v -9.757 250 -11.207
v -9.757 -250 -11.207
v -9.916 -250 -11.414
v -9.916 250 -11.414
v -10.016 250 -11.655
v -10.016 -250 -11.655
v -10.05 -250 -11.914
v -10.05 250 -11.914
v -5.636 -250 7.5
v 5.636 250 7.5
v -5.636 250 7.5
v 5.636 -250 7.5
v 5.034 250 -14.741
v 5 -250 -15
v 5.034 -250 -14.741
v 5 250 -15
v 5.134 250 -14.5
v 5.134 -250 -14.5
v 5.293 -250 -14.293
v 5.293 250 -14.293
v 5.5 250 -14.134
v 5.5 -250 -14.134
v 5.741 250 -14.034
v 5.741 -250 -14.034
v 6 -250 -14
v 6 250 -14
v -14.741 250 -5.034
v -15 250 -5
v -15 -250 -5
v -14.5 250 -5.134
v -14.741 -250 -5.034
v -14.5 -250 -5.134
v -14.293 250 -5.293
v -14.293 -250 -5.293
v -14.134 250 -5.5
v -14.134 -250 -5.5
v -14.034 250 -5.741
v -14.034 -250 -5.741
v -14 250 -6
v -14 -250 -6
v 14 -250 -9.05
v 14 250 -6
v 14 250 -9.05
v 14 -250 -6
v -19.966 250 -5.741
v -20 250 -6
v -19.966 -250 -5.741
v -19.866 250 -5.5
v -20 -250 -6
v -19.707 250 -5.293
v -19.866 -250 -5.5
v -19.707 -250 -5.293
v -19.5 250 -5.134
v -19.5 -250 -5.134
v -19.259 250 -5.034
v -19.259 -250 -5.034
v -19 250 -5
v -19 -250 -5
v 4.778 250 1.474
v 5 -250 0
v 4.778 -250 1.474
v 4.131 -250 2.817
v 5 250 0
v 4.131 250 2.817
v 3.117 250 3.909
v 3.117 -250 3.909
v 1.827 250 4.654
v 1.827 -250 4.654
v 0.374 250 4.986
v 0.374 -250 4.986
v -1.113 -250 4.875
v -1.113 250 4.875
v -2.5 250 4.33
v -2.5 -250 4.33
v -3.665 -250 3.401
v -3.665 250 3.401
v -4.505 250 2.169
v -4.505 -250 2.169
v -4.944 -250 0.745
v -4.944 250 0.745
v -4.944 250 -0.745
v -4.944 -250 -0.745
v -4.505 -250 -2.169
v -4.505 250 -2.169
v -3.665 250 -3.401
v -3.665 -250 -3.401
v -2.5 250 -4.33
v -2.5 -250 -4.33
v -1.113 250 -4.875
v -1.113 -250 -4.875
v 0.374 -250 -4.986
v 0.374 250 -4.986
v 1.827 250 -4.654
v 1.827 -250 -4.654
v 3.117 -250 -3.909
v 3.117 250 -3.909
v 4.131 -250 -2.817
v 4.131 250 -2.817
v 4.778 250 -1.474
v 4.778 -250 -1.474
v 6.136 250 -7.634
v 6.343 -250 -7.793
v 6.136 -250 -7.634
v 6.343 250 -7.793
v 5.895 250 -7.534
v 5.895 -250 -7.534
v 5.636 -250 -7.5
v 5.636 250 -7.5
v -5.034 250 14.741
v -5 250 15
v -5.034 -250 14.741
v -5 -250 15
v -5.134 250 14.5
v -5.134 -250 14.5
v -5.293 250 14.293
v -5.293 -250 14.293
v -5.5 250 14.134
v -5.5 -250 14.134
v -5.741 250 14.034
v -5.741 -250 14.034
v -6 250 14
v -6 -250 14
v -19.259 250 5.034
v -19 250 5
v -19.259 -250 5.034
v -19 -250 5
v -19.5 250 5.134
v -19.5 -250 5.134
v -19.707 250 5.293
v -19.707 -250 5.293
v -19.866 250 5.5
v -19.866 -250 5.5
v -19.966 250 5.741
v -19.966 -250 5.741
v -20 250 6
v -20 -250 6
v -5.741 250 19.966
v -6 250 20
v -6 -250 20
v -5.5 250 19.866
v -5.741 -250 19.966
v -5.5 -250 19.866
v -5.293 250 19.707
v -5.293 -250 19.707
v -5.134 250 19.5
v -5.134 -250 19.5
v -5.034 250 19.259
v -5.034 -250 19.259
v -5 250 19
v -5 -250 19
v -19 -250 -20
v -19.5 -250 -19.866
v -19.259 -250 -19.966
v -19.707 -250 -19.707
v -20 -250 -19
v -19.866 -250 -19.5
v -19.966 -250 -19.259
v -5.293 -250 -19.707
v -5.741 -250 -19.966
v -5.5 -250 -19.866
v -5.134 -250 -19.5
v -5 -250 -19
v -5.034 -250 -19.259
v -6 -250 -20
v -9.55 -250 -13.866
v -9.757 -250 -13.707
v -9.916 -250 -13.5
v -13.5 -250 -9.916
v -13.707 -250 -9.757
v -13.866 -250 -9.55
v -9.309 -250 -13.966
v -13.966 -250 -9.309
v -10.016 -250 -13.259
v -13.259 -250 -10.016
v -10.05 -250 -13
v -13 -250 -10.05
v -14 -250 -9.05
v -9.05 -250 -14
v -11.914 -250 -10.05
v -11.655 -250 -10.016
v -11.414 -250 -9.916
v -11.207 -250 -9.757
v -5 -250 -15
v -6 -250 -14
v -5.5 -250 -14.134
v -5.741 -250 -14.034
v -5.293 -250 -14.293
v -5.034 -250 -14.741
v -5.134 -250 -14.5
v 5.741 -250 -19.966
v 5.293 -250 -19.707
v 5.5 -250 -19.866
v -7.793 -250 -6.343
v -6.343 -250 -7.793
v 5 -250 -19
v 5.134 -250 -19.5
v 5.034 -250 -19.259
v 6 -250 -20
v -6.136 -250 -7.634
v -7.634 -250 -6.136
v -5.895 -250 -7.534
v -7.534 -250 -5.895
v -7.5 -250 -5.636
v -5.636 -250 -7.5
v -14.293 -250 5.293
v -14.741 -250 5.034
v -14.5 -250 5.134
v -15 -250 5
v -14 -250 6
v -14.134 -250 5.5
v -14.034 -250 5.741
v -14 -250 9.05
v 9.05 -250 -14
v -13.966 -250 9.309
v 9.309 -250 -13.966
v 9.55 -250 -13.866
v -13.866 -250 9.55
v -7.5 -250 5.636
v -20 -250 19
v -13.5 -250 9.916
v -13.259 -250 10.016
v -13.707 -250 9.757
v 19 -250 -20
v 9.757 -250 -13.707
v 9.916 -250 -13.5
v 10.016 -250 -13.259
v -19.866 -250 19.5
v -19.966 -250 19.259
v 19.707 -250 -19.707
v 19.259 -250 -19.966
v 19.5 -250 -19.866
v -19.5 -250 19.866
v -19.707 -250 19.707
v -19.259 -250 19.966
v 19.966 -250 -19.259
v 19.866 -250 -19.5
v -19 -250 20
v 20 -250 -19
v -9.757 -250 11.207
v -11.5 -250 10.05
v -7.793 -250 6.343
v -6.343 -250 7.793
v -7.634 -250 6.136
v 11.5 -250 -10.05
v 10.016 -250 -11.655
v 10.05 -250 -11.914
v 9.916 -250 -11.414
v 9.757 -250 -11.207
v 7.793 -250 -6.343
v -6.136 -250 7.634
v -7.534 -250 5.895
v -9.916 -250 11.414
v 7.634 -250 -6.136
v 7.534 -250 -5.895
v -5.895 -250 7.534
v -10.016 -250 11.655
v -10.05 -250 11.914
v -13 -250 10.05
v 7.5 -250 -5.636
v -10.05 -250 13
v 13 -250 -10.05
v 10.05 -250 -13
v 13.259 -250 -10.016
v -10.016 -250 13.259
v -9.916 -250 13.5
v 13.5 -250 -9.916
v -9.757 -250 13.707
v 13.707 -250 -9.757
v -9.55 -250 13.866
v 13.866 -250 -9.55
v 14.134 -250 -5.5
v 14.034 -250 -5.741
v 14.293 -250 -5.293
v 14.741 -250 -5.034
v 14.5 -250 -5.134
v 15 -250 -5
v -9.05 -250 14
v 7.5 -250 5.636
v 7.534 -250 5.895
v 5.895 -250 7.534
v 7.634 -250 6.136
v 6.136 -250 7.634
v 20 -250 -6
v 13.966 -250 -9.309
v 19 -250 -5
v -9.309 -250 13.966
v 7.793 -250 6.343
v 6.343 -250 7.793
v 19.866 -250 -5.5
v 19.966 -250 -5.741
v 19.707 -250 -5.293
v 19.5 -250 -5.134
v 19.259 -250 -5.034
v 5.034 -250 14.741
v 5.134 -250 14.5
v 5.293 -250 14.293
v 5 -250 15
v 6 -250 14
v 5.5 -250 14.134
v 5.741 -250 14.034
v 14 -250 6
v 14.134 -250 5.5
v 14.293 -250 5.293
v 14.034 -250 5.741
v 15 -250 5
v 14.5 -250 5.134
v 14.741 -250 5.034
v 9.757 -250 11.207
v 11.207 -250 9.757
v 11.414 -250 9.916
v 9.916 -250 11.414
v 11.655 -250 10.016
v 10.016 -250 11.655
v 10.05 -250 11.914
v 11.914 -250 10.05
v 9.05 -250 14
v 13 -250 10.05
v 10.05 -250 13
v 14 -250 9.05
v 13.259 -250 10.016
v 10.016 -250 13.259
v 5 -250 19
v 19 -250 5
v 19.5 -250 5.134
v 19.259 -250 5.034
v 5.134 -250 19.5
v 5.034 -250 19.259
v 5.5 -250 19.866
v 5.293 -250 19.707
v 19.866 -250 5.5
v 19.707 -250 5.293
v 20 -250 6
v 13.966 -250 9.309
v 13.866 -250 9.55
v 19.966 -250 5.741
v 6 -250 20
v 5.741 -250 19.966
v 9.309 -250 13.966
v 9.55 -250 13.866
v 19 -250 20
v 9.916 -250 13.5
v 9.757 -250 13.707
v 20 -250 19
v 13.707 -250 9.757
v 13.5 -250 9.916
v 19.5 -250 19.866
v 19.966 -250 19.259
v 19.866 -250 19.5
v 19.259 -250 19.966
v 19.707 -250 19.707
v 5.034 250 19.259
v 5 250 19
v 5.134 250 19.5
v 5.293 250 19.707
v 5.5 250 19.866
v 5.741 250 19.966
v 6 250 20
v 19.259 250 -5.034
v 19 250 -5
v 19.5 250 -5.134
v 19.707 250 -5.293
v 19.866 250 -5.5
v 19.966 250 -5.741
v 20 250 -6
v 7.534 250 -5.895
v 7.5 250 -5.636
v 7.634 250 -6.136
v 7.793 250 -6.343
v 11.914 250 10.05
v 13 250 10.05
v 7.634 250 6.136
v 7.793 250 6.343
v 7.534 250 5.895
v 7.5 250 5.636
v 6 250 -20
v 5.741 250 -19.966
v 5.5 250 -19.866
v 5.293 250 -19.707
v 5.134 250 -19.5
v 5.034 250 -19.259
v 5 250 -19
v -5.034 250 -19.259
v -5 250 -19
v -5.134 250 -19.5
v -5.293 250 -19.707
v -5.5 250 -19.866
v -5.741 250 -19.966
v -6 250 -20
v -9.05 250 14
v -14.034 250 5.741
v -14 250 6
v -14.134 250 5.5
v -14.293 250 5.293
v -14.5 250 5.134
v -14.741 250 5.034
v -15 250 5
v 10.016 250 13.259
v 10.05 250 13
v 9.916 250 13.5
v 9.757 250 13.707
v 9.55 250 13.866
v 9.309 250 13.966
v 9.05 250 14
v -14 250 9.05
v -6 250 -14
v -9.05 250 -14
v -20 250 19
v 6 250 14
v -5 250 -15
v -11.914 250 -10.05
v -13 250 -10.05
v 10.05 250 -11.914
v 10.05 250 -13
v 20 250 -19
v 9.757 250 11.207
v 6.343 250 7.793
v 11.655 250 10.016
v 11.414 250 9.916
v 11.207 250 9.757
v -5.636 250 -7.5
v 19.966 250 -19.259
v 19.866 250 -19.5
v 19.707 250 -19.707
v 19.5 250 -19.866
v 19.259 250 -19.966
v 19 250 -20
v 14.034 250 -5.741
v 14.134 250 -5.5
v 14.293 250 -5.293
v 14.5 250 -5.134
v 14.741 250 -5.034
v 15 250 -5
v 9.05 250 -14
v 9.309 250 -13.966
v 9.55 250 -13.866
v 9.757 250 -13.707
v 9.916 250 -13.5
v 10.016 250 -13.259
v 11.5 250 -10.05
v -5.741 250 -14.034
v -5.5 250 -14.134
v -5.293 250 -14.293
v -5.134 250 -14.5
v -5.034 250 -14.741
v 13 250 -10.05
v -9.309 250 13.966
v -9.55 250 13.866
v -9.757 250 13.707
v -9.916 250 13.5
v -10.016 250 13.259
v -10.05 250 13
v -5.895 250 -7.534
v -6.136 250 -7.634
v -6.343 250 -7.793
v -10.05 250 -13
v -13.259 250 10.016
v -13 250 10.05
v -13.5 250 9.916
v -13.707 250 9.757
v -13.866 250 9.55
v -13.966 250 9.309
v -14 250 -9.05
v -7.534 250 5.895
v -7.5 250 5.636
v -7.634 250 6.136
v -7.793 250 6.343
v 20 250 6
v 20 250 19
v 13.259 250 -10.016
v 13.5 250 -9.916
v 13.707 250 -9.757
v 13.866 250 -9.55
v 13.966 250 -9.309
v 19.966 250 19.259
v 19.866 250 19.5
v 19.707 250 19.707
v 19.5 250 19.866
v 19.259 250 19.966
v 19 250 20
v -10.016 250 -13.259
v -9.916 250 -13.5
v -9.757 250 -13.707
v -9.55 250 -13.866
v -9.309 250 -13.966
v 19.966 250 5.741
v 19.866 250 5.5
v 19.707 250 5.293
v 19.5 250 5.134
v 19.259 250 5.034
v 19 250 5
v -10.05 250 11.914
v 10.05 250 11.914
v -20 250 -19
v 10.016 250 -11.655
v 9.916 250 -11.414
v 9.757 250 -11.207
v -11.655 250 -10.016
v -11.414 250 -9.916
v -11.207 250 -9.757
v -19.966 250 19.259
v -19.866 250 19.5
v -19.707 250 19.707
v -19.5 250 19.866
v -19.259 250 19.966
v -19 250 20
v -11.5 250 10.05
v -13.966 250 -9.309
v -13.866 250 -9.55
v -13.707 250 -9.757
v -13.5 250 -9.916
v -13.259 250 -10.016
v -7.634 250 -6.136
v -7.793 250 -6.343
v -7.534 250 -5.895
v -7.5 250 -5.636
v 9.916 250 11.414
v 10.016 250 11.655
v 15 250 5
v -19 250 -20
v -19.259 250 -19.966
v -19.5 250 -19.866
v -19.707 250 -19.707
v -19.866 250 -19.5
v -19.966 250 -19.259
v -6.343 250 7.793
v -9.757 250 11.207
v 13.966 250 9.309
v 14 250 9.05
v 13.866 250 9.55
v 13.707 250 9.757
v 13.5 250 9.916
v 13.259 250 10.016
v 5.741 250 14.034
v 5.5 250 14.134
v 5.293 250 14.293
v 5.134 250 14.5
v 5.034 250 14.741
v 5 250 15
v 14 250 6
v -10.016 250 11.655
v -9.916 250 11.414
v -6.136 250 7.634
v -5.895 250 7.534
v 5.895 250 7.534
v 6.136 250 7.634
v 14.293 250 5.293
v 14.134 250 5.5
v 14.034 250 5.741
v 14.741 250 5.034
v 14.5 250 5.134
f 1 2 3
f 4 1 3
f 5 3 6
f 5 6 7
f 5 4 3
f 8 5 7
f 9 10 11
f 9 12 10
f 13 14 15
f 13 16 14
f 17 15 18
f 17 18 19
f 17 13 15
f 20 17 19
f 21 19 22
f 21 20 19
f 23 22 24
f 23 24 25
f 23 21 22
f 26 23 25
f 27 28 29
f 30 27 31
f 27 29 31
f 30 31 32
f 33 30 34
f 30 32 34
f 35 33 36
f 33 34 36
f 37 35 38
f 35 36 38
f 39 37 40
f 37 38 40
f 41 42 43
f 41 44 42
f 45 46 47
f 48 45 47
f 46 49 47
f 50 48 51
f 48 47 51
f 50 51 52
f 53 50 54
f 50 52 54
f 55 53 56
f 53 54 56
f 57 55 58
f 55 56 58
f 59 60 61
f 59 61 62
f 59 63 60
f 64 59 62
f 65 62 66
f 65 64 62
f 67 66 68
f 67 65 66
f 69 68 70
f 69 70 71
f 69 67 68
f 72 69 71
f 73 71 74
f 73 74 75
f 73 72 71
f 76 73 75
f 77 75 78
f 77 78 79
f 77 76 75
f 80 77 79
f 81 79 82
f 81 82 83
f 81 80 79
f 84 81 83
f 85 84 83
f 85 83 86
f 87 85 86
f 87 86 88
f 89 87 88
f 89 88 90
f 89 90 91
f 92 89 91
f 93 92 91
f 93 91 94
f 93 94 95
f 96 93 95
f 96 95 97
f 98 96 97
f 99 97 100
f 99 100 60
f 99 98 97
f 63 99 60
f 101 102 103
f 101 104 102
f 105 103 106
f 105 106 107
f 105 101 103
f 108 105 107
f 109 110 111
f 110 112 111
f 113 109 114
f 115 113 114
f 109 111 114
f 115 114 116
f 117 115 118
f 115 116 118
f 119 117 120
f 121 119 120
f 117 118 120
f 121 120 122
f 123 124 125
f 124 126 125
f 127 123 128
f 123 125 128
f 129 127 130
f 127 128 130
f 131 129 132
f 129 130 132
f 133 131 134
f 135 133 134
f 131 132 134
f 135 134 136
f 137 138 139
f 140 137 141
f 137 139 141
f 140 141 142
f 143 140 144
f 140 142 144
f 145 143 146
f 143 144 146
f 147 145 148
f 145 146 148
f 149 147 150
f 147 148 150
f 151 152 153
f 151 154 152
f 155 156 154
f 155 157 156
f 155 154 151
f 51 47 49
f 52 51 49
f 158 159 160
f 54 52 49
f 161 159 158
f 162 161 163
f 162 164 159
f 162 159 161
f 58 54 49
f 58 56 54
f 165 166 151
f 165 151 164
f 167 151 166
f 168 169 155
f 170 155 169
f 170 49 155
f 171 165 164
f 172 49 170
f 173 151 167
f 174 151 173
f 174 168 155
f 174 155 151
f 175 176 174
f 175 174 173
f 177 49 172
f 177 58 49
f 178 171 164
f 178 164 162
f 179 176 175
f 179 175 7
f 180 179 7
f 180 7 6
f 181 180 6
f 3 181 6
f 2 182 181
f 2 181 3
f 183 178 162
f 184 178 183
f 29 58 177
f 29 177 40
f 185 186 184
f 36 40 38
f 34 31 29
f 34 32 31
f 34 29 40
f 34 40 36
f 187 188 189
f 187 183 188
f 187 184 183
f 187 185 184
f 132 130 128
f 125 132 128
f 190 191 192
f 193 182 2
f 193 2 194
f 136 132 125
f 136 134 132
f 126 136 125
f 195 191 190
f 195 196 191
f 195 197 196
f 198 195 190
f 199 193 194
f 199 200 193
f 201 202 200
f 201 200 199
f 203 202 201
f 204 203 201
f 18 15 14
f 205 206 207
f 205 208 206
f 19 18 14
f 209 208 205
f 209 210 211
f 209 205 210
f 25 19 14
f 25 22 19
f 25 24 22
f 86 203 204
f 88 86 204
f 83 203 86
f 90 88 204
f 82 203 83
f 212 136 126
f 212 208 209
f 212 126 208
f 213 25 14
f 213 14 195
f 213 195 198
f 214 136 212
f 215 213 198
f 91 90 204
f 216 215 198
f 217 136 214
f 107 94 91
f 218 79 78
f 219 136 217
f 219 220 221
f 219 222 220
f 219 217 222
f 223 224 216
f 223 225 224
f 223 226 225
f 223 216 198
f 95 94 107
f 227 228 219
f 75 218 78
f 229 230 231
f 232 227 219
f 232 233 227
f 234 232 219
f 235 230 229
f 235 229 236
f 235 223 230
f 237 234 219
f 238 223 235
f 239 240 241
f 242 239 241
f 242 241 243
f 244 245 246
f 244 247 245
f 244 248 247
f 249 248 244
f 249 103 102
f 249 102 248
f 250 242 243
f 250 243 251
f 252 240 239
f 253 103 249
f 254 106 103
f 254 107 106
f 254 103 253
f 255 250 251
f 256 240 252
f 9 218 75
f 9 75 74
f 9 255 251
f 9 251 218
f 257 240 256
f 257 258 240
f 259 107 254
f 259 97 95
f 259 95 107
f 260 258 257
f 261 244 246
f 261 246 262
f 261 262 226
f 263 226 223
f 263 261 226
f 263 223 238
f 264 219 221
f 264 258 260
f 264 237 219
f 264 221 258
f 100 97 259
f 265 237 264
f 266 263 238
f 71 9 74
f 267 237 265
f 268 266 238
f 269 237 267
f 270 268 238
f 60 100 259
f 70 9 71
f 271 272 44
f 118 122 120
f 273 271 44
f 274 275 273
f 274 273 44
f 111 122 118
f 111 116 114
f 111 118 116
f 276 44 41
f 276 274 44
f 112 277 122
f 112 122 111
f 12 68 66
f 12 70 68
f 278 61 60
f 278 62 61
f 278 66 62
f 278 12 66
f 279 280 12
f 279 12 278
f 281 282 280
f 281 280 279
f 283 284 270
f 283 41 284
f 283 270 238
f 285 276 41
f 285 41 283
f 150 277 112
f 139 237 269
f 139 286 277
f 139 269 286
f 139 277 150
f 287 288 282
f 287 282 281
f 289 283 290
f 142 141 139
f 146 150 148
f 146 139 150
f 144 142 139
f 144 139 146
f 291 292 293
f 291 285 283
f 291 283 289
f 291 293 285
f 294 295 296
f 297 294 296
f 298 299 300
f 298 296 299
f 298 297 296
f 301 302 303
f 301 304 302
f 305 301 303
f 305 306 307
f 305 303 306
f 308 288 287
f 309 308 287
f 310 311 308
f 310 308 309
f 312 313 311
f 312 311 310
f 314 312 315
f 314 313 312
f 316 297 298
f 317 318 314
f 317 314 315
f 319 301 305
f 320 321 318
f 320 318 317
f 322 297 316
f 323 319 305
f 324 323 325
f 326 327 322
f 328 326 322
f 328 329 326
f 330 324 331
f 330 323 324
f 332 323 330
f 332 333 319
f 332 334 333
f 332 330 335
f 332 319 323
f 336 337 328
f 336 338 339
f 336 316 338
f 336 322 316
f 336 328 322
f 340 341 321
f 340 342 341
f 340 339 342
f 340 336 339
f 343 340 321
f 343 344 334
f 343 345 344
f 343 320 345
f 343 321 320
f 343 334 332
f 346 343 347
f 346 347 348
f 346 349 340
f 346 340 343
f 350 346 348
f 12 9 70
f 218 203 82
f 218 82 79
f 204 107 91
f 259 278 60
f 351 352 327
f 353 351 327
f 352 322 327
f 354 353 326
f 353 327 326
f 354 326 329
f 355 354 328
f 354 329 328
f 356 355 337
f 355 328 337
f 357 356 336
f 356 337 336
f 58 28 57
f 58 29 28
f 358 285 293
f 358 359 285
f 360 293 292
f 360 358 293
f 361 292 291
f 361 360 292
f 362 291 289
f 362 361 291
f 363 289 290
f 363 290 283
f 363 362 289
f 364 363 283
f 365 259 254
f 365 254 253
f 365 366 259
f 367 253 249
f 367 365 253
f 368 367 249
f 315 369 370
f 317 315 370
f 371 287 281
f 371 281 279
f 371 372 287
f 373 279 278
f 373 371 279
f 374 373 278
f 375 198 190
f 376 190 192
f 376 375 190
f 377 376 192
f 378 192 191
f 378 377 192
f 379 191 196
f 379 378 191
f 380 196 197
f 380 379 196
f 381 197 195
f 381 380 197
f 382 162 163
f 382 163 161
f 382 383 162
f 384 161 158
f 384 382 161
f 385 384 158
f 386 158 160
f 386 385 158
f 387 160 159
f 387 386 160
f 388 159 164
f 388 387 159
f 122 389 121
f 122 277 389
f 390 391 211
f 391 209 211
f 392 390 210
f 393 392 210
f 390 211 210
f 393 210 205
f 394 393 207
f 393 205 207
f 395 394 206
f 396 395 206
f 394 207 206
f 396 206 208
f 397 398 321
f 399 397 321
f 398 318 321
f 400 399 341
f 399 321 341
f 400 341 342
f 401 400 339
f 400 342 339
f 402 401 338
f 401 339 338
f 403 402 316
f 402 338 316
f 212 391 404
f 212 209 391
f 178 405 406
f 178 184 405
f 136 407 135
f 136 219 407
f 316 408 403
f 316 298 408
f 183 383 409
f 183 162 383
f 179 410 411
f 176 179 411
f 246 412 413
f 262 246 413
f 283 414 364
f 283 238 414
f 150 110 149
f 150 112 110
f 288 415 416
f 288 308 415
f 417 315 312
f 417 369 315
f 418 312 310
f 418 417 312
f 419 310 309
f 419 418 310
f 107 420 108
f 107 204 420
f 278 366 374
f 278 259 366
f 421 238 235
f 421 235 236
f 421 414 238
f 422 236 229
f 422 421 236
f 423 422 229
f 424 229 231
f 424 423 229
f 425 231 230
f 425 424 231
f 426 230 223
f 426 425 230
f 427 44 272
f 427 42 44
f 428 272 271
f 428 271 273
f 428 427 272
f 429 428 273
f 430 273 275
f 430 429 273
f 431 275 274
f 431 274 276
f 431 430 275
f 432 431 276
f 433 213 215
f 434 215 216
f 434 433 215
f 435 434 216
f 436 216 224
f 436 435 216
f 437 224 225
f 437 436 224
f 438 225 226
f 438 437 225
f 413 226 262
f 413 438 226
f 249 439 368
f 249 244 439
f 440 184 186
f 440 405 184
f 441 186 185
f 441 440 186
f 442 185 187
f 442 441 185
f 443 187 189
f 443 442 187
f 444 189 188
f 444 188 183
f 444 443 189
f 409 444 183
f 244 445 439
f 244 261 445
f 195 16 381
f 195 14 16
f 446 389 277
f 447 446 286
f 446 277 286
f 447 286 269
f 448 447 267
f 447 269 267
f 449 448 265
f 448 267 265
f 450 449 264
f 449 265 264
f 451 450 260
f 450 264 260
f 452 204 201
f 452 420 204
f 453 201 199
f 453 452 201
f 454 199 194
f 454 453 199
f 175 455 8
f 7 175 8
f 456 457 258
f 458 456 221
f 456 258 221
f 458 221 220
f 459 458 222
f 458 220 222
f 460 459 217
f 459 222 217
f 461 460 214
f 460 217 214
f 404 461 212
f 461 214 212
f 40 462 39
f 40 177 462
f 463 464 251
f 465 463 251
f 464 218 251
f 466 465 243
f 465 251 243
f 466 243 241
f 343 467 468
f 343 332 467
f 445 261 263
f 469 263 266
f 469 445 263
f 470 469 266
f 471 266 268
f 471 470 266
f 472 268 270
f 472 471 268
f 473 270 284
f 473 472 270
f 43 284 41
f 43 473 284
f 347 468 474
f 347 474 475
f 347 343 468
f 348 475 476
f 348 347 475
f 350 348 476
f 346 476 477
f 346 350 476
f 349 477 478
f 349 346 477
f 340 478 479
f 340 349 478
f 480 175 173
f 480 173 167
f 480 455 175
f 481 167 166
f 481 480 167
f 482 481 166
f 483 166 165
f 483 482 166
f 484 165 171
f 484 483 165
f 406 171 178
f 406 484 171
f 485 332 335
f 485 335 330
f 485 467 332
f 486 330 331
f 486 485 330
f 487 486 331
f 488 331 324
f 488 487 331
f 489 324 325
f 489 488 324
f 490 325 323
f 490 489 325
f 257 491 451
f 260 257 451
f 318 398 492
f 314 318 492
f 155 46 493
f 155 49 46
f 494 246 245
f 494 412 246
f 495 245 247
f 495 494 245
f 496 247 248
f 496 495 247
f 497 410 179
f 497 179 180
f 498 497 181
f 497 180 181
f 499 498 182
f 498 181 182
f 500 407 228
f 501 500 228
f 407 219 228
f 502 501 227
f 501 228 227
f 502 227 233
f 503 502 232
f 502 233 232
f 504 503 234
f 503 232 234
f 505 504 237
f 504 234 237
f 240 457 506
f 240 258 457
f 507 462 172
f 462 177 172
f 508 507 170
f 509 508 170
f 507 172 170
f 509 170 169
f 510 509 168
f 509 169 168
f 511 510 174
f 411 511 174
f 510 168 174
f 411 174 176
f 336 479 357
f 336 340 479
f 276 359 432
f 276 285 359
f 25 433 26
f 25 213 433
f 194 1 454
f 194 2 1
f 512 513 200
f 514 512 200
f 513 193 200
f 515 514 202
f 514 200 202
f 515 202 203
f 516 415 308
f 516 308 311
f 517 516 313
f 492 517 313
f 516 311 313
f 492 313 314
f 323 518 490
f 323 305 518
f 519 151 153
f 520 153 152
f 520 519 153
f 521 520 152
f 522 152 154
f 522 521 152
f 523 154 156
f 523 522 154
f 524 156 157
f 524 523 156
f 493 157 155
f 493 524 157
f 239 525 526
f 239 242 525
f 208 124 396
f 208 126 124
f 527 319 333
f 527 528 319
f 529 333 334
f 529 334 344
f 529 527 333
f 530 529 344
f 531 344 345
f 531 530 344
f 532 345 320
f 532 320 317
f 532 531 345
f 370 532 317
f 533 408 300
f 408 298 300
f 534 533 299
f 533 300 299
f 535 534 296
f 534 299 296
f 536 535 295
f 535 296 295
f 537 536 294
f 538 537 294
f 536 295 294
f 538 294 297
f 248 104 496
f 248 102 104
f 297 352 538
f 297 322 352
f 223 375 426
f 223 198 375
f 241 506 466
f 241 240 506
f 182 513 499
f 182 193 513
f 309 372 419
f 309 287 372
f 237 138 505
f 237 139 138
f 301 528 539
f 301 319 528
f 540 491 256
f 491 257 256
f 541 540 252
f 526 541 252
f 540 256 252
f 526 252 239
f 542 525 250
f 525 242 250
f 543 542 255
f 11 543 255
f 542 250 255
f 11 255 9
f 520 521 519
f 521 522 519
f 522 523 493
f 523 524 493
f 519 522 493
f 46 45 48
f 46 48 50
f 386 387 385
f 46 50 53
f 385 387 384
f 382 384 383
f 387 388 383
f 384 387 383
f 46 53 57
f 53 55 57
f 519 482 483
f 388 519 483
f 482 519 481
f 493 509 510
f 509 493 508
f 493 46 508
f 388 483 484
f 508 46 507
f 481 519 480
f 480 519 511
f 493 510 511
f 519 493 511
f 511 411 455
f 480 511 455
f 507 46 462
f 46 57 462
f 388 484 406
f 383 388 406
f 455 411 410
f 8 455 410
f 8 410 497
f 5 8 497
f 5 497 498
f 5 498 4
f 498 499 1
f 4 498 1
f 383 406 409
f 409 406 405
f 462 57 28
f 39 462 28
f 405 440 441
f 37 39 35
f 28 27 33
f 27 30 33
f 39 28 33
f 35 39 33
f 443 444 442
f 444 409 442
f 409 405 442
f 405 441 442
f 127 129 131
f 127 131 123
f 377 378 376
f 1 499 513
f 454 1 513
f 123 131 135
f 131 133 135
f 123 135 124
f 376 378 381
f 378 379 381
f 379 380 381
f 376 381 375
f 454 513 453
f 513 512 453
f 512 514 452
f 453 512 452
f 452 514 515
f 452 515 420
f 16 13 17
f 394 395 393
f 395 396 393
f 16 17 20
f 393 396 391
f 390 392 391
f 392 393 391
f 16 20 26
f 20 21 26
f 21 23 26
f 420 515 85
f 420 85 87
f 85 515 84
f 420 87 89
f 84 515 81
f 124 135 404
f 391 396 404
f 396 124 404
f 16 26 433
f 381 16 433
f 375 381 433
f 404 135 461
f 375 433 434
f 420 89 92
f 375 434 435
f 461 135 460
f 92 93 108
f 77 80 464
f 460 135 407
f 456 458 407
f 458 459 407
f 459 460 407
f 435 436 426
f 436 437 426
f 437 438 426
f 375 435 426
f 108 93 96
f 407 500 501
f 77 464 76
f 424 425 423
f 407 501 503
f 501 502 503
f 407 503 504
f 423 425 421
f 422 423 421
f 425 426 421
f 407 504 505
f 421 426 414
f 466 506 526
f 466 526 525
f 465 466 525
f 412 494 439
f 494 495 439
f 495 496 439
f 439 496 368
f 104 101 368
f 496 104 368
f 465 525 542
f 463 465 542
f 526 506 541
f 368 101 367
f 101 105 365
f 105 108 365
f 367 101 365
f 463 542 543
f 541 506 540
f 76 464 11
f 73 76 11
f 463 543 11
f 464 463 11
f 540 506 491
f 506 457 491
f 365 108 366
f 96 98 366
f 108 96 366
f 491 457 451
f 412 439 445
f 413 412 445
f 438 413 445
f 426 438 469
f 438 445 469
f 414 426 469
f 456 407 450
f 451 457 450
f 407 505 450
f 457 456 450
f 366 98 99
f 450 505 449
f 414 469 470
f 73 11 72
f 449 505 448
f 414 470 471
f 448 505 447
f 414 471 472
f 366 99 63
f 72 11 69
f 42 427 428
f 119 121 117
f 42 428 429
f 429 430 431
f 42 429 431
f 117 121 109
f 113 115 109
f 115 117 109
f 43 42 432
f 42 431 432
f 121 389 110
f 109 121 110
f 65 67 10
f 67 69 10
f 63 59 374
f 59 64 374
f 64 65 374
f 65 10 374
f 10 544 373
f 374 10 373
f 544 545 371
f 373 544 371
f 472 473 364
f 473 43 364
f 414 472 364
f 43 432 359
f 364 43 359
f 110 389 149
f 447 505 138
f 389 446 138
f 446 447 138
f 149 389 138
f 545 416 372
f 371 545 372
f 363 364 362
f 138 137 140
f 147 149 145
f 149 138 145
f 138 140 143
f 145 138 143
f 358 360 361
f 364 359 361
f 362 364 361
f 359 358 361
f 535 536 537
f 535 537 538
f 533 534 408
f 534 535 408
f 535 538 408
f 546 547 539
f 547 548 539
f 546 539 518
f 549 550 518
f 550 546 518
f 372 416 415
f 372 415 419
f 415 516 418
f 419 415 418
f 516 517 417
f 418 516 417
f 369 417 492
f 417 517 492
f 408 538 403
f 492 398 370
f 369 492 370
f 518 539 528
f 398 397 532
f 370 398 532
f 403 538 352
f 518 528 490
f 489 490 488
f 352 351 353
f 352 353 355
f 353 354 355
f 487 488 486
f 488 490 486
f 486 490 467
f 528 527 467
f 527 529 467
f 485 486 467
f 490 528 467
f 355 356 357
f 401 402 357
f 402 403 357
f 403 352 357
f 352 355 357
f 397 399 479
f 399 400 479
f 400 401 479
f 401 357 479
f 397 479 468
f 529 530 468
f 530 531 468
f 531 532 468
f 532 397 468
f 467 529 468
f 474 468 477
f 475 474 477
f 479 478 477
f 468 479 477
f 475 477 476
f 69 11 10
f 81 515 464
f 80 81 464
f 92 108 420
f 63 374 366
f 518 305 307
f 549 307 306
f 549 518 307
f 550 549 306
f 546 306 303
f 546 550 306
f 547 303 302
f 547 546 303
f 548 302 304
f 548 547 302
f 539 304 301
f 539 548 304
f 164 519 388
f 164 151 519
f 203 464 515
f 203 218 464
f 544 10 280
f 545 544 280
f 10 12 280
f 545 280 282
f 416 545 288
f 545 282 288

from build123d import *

# Parameters (mm, degrees)
F0_R     = 5
F1_DEPTH = 250
F2_R     = 1


with BuildPart() as f1:
    # F0 (on Front) → F1 (new body, symmetric)
    with BuildSketch(Plane.XZ):
        Polygon((20, 5), (20, 20), (5, 20), (5, 14), (10.05, 14), (10.05, 11.5), (6.05, 7.5), (-6.05, 7.5), (-10.05, 11.5), (-10.05, 14), (-5, 14), (-5, 20), (-20, 20), (-20, 5), (-14, 5), (-14, 10.05), (-11.5, 10.05), (-7.5, 6.05), (-7.5, -6.05), (-11.5, -10.05), (-14, -10.05), (-14, -5), (-20, -5), (-20, -20), (-5, -20), (-5, -14), (-10.05, -14), (-10.05, -11.5), (-6.05, -7.5), (6.05, -7.5), (10.05, -11.5), (10.05, -14), (5, -14), (5, -20), (20, -20), (20, -5), (14, -5), (14, -10.05), (11.5, -10.05), (7.5, -6.05), (7.5, 6.05), (11.5, 10.05), (14, 10.05), (14, 5), align=None)
        Circle(F0_R, mode=Mode.SUBTRACT)
    extrude(amount=F1_DEPTH, both=True)

    # F2
    f2_edges = [f1.edges().sort_by_distance(p)[0] for p in [
        (-5, 0, 20),
        (5, 0, 20),
        (20, 0, 20),
        (20, 0, 5),
        (-5, 0, 14),
        (-6.05, 0, 7.5),
        (-10.05, 0, 11.5),
        (-10.05, 0, 14),
        (10.05, 0, 14),
        (5, 0, 14),
        (10.05, 0, 11.5),
        (6.05, 0, 7.5),
        (20, 0, -5),
        (14, 0, -5),
        (7.5, 0, 6.05),
        (7.5, 0, -6.05),
        (-10.05, 0, -11.5),
        (-10.05, 0, -14),
        (5, 0, -14),
        (20, 0, -20),
        (-5, 0, -20),
        (-14, 0, -5),
        (-14, 0, -10.05),
        (-14, 0, 5),
        (-20, 0, 20),
        (14, 0, -10.05),
        (10.05, 0, -11.5),
        (10.05, 0, -14),
        (-5, 0, -14),
        (5, 0, -20),
        (-14, 0, 10.05),
        (-20, 0, 5),
        (-20, 0, -5),
        (-7.5, 0, 6.05),
        (-7.5, 0, -6.05),
        (-11.5, 0, -10.05),
        (14, 0, 10.05),
        (11.5, 0, 10.05),
        (14, 0, 5),
        (-6.05, 0, -7.5),
        (6.05, 0, -7.5),
        (-20, 0, -20),
    ]]
    fillet(f2_edges, radius=F2_R)


solid = f1.part
